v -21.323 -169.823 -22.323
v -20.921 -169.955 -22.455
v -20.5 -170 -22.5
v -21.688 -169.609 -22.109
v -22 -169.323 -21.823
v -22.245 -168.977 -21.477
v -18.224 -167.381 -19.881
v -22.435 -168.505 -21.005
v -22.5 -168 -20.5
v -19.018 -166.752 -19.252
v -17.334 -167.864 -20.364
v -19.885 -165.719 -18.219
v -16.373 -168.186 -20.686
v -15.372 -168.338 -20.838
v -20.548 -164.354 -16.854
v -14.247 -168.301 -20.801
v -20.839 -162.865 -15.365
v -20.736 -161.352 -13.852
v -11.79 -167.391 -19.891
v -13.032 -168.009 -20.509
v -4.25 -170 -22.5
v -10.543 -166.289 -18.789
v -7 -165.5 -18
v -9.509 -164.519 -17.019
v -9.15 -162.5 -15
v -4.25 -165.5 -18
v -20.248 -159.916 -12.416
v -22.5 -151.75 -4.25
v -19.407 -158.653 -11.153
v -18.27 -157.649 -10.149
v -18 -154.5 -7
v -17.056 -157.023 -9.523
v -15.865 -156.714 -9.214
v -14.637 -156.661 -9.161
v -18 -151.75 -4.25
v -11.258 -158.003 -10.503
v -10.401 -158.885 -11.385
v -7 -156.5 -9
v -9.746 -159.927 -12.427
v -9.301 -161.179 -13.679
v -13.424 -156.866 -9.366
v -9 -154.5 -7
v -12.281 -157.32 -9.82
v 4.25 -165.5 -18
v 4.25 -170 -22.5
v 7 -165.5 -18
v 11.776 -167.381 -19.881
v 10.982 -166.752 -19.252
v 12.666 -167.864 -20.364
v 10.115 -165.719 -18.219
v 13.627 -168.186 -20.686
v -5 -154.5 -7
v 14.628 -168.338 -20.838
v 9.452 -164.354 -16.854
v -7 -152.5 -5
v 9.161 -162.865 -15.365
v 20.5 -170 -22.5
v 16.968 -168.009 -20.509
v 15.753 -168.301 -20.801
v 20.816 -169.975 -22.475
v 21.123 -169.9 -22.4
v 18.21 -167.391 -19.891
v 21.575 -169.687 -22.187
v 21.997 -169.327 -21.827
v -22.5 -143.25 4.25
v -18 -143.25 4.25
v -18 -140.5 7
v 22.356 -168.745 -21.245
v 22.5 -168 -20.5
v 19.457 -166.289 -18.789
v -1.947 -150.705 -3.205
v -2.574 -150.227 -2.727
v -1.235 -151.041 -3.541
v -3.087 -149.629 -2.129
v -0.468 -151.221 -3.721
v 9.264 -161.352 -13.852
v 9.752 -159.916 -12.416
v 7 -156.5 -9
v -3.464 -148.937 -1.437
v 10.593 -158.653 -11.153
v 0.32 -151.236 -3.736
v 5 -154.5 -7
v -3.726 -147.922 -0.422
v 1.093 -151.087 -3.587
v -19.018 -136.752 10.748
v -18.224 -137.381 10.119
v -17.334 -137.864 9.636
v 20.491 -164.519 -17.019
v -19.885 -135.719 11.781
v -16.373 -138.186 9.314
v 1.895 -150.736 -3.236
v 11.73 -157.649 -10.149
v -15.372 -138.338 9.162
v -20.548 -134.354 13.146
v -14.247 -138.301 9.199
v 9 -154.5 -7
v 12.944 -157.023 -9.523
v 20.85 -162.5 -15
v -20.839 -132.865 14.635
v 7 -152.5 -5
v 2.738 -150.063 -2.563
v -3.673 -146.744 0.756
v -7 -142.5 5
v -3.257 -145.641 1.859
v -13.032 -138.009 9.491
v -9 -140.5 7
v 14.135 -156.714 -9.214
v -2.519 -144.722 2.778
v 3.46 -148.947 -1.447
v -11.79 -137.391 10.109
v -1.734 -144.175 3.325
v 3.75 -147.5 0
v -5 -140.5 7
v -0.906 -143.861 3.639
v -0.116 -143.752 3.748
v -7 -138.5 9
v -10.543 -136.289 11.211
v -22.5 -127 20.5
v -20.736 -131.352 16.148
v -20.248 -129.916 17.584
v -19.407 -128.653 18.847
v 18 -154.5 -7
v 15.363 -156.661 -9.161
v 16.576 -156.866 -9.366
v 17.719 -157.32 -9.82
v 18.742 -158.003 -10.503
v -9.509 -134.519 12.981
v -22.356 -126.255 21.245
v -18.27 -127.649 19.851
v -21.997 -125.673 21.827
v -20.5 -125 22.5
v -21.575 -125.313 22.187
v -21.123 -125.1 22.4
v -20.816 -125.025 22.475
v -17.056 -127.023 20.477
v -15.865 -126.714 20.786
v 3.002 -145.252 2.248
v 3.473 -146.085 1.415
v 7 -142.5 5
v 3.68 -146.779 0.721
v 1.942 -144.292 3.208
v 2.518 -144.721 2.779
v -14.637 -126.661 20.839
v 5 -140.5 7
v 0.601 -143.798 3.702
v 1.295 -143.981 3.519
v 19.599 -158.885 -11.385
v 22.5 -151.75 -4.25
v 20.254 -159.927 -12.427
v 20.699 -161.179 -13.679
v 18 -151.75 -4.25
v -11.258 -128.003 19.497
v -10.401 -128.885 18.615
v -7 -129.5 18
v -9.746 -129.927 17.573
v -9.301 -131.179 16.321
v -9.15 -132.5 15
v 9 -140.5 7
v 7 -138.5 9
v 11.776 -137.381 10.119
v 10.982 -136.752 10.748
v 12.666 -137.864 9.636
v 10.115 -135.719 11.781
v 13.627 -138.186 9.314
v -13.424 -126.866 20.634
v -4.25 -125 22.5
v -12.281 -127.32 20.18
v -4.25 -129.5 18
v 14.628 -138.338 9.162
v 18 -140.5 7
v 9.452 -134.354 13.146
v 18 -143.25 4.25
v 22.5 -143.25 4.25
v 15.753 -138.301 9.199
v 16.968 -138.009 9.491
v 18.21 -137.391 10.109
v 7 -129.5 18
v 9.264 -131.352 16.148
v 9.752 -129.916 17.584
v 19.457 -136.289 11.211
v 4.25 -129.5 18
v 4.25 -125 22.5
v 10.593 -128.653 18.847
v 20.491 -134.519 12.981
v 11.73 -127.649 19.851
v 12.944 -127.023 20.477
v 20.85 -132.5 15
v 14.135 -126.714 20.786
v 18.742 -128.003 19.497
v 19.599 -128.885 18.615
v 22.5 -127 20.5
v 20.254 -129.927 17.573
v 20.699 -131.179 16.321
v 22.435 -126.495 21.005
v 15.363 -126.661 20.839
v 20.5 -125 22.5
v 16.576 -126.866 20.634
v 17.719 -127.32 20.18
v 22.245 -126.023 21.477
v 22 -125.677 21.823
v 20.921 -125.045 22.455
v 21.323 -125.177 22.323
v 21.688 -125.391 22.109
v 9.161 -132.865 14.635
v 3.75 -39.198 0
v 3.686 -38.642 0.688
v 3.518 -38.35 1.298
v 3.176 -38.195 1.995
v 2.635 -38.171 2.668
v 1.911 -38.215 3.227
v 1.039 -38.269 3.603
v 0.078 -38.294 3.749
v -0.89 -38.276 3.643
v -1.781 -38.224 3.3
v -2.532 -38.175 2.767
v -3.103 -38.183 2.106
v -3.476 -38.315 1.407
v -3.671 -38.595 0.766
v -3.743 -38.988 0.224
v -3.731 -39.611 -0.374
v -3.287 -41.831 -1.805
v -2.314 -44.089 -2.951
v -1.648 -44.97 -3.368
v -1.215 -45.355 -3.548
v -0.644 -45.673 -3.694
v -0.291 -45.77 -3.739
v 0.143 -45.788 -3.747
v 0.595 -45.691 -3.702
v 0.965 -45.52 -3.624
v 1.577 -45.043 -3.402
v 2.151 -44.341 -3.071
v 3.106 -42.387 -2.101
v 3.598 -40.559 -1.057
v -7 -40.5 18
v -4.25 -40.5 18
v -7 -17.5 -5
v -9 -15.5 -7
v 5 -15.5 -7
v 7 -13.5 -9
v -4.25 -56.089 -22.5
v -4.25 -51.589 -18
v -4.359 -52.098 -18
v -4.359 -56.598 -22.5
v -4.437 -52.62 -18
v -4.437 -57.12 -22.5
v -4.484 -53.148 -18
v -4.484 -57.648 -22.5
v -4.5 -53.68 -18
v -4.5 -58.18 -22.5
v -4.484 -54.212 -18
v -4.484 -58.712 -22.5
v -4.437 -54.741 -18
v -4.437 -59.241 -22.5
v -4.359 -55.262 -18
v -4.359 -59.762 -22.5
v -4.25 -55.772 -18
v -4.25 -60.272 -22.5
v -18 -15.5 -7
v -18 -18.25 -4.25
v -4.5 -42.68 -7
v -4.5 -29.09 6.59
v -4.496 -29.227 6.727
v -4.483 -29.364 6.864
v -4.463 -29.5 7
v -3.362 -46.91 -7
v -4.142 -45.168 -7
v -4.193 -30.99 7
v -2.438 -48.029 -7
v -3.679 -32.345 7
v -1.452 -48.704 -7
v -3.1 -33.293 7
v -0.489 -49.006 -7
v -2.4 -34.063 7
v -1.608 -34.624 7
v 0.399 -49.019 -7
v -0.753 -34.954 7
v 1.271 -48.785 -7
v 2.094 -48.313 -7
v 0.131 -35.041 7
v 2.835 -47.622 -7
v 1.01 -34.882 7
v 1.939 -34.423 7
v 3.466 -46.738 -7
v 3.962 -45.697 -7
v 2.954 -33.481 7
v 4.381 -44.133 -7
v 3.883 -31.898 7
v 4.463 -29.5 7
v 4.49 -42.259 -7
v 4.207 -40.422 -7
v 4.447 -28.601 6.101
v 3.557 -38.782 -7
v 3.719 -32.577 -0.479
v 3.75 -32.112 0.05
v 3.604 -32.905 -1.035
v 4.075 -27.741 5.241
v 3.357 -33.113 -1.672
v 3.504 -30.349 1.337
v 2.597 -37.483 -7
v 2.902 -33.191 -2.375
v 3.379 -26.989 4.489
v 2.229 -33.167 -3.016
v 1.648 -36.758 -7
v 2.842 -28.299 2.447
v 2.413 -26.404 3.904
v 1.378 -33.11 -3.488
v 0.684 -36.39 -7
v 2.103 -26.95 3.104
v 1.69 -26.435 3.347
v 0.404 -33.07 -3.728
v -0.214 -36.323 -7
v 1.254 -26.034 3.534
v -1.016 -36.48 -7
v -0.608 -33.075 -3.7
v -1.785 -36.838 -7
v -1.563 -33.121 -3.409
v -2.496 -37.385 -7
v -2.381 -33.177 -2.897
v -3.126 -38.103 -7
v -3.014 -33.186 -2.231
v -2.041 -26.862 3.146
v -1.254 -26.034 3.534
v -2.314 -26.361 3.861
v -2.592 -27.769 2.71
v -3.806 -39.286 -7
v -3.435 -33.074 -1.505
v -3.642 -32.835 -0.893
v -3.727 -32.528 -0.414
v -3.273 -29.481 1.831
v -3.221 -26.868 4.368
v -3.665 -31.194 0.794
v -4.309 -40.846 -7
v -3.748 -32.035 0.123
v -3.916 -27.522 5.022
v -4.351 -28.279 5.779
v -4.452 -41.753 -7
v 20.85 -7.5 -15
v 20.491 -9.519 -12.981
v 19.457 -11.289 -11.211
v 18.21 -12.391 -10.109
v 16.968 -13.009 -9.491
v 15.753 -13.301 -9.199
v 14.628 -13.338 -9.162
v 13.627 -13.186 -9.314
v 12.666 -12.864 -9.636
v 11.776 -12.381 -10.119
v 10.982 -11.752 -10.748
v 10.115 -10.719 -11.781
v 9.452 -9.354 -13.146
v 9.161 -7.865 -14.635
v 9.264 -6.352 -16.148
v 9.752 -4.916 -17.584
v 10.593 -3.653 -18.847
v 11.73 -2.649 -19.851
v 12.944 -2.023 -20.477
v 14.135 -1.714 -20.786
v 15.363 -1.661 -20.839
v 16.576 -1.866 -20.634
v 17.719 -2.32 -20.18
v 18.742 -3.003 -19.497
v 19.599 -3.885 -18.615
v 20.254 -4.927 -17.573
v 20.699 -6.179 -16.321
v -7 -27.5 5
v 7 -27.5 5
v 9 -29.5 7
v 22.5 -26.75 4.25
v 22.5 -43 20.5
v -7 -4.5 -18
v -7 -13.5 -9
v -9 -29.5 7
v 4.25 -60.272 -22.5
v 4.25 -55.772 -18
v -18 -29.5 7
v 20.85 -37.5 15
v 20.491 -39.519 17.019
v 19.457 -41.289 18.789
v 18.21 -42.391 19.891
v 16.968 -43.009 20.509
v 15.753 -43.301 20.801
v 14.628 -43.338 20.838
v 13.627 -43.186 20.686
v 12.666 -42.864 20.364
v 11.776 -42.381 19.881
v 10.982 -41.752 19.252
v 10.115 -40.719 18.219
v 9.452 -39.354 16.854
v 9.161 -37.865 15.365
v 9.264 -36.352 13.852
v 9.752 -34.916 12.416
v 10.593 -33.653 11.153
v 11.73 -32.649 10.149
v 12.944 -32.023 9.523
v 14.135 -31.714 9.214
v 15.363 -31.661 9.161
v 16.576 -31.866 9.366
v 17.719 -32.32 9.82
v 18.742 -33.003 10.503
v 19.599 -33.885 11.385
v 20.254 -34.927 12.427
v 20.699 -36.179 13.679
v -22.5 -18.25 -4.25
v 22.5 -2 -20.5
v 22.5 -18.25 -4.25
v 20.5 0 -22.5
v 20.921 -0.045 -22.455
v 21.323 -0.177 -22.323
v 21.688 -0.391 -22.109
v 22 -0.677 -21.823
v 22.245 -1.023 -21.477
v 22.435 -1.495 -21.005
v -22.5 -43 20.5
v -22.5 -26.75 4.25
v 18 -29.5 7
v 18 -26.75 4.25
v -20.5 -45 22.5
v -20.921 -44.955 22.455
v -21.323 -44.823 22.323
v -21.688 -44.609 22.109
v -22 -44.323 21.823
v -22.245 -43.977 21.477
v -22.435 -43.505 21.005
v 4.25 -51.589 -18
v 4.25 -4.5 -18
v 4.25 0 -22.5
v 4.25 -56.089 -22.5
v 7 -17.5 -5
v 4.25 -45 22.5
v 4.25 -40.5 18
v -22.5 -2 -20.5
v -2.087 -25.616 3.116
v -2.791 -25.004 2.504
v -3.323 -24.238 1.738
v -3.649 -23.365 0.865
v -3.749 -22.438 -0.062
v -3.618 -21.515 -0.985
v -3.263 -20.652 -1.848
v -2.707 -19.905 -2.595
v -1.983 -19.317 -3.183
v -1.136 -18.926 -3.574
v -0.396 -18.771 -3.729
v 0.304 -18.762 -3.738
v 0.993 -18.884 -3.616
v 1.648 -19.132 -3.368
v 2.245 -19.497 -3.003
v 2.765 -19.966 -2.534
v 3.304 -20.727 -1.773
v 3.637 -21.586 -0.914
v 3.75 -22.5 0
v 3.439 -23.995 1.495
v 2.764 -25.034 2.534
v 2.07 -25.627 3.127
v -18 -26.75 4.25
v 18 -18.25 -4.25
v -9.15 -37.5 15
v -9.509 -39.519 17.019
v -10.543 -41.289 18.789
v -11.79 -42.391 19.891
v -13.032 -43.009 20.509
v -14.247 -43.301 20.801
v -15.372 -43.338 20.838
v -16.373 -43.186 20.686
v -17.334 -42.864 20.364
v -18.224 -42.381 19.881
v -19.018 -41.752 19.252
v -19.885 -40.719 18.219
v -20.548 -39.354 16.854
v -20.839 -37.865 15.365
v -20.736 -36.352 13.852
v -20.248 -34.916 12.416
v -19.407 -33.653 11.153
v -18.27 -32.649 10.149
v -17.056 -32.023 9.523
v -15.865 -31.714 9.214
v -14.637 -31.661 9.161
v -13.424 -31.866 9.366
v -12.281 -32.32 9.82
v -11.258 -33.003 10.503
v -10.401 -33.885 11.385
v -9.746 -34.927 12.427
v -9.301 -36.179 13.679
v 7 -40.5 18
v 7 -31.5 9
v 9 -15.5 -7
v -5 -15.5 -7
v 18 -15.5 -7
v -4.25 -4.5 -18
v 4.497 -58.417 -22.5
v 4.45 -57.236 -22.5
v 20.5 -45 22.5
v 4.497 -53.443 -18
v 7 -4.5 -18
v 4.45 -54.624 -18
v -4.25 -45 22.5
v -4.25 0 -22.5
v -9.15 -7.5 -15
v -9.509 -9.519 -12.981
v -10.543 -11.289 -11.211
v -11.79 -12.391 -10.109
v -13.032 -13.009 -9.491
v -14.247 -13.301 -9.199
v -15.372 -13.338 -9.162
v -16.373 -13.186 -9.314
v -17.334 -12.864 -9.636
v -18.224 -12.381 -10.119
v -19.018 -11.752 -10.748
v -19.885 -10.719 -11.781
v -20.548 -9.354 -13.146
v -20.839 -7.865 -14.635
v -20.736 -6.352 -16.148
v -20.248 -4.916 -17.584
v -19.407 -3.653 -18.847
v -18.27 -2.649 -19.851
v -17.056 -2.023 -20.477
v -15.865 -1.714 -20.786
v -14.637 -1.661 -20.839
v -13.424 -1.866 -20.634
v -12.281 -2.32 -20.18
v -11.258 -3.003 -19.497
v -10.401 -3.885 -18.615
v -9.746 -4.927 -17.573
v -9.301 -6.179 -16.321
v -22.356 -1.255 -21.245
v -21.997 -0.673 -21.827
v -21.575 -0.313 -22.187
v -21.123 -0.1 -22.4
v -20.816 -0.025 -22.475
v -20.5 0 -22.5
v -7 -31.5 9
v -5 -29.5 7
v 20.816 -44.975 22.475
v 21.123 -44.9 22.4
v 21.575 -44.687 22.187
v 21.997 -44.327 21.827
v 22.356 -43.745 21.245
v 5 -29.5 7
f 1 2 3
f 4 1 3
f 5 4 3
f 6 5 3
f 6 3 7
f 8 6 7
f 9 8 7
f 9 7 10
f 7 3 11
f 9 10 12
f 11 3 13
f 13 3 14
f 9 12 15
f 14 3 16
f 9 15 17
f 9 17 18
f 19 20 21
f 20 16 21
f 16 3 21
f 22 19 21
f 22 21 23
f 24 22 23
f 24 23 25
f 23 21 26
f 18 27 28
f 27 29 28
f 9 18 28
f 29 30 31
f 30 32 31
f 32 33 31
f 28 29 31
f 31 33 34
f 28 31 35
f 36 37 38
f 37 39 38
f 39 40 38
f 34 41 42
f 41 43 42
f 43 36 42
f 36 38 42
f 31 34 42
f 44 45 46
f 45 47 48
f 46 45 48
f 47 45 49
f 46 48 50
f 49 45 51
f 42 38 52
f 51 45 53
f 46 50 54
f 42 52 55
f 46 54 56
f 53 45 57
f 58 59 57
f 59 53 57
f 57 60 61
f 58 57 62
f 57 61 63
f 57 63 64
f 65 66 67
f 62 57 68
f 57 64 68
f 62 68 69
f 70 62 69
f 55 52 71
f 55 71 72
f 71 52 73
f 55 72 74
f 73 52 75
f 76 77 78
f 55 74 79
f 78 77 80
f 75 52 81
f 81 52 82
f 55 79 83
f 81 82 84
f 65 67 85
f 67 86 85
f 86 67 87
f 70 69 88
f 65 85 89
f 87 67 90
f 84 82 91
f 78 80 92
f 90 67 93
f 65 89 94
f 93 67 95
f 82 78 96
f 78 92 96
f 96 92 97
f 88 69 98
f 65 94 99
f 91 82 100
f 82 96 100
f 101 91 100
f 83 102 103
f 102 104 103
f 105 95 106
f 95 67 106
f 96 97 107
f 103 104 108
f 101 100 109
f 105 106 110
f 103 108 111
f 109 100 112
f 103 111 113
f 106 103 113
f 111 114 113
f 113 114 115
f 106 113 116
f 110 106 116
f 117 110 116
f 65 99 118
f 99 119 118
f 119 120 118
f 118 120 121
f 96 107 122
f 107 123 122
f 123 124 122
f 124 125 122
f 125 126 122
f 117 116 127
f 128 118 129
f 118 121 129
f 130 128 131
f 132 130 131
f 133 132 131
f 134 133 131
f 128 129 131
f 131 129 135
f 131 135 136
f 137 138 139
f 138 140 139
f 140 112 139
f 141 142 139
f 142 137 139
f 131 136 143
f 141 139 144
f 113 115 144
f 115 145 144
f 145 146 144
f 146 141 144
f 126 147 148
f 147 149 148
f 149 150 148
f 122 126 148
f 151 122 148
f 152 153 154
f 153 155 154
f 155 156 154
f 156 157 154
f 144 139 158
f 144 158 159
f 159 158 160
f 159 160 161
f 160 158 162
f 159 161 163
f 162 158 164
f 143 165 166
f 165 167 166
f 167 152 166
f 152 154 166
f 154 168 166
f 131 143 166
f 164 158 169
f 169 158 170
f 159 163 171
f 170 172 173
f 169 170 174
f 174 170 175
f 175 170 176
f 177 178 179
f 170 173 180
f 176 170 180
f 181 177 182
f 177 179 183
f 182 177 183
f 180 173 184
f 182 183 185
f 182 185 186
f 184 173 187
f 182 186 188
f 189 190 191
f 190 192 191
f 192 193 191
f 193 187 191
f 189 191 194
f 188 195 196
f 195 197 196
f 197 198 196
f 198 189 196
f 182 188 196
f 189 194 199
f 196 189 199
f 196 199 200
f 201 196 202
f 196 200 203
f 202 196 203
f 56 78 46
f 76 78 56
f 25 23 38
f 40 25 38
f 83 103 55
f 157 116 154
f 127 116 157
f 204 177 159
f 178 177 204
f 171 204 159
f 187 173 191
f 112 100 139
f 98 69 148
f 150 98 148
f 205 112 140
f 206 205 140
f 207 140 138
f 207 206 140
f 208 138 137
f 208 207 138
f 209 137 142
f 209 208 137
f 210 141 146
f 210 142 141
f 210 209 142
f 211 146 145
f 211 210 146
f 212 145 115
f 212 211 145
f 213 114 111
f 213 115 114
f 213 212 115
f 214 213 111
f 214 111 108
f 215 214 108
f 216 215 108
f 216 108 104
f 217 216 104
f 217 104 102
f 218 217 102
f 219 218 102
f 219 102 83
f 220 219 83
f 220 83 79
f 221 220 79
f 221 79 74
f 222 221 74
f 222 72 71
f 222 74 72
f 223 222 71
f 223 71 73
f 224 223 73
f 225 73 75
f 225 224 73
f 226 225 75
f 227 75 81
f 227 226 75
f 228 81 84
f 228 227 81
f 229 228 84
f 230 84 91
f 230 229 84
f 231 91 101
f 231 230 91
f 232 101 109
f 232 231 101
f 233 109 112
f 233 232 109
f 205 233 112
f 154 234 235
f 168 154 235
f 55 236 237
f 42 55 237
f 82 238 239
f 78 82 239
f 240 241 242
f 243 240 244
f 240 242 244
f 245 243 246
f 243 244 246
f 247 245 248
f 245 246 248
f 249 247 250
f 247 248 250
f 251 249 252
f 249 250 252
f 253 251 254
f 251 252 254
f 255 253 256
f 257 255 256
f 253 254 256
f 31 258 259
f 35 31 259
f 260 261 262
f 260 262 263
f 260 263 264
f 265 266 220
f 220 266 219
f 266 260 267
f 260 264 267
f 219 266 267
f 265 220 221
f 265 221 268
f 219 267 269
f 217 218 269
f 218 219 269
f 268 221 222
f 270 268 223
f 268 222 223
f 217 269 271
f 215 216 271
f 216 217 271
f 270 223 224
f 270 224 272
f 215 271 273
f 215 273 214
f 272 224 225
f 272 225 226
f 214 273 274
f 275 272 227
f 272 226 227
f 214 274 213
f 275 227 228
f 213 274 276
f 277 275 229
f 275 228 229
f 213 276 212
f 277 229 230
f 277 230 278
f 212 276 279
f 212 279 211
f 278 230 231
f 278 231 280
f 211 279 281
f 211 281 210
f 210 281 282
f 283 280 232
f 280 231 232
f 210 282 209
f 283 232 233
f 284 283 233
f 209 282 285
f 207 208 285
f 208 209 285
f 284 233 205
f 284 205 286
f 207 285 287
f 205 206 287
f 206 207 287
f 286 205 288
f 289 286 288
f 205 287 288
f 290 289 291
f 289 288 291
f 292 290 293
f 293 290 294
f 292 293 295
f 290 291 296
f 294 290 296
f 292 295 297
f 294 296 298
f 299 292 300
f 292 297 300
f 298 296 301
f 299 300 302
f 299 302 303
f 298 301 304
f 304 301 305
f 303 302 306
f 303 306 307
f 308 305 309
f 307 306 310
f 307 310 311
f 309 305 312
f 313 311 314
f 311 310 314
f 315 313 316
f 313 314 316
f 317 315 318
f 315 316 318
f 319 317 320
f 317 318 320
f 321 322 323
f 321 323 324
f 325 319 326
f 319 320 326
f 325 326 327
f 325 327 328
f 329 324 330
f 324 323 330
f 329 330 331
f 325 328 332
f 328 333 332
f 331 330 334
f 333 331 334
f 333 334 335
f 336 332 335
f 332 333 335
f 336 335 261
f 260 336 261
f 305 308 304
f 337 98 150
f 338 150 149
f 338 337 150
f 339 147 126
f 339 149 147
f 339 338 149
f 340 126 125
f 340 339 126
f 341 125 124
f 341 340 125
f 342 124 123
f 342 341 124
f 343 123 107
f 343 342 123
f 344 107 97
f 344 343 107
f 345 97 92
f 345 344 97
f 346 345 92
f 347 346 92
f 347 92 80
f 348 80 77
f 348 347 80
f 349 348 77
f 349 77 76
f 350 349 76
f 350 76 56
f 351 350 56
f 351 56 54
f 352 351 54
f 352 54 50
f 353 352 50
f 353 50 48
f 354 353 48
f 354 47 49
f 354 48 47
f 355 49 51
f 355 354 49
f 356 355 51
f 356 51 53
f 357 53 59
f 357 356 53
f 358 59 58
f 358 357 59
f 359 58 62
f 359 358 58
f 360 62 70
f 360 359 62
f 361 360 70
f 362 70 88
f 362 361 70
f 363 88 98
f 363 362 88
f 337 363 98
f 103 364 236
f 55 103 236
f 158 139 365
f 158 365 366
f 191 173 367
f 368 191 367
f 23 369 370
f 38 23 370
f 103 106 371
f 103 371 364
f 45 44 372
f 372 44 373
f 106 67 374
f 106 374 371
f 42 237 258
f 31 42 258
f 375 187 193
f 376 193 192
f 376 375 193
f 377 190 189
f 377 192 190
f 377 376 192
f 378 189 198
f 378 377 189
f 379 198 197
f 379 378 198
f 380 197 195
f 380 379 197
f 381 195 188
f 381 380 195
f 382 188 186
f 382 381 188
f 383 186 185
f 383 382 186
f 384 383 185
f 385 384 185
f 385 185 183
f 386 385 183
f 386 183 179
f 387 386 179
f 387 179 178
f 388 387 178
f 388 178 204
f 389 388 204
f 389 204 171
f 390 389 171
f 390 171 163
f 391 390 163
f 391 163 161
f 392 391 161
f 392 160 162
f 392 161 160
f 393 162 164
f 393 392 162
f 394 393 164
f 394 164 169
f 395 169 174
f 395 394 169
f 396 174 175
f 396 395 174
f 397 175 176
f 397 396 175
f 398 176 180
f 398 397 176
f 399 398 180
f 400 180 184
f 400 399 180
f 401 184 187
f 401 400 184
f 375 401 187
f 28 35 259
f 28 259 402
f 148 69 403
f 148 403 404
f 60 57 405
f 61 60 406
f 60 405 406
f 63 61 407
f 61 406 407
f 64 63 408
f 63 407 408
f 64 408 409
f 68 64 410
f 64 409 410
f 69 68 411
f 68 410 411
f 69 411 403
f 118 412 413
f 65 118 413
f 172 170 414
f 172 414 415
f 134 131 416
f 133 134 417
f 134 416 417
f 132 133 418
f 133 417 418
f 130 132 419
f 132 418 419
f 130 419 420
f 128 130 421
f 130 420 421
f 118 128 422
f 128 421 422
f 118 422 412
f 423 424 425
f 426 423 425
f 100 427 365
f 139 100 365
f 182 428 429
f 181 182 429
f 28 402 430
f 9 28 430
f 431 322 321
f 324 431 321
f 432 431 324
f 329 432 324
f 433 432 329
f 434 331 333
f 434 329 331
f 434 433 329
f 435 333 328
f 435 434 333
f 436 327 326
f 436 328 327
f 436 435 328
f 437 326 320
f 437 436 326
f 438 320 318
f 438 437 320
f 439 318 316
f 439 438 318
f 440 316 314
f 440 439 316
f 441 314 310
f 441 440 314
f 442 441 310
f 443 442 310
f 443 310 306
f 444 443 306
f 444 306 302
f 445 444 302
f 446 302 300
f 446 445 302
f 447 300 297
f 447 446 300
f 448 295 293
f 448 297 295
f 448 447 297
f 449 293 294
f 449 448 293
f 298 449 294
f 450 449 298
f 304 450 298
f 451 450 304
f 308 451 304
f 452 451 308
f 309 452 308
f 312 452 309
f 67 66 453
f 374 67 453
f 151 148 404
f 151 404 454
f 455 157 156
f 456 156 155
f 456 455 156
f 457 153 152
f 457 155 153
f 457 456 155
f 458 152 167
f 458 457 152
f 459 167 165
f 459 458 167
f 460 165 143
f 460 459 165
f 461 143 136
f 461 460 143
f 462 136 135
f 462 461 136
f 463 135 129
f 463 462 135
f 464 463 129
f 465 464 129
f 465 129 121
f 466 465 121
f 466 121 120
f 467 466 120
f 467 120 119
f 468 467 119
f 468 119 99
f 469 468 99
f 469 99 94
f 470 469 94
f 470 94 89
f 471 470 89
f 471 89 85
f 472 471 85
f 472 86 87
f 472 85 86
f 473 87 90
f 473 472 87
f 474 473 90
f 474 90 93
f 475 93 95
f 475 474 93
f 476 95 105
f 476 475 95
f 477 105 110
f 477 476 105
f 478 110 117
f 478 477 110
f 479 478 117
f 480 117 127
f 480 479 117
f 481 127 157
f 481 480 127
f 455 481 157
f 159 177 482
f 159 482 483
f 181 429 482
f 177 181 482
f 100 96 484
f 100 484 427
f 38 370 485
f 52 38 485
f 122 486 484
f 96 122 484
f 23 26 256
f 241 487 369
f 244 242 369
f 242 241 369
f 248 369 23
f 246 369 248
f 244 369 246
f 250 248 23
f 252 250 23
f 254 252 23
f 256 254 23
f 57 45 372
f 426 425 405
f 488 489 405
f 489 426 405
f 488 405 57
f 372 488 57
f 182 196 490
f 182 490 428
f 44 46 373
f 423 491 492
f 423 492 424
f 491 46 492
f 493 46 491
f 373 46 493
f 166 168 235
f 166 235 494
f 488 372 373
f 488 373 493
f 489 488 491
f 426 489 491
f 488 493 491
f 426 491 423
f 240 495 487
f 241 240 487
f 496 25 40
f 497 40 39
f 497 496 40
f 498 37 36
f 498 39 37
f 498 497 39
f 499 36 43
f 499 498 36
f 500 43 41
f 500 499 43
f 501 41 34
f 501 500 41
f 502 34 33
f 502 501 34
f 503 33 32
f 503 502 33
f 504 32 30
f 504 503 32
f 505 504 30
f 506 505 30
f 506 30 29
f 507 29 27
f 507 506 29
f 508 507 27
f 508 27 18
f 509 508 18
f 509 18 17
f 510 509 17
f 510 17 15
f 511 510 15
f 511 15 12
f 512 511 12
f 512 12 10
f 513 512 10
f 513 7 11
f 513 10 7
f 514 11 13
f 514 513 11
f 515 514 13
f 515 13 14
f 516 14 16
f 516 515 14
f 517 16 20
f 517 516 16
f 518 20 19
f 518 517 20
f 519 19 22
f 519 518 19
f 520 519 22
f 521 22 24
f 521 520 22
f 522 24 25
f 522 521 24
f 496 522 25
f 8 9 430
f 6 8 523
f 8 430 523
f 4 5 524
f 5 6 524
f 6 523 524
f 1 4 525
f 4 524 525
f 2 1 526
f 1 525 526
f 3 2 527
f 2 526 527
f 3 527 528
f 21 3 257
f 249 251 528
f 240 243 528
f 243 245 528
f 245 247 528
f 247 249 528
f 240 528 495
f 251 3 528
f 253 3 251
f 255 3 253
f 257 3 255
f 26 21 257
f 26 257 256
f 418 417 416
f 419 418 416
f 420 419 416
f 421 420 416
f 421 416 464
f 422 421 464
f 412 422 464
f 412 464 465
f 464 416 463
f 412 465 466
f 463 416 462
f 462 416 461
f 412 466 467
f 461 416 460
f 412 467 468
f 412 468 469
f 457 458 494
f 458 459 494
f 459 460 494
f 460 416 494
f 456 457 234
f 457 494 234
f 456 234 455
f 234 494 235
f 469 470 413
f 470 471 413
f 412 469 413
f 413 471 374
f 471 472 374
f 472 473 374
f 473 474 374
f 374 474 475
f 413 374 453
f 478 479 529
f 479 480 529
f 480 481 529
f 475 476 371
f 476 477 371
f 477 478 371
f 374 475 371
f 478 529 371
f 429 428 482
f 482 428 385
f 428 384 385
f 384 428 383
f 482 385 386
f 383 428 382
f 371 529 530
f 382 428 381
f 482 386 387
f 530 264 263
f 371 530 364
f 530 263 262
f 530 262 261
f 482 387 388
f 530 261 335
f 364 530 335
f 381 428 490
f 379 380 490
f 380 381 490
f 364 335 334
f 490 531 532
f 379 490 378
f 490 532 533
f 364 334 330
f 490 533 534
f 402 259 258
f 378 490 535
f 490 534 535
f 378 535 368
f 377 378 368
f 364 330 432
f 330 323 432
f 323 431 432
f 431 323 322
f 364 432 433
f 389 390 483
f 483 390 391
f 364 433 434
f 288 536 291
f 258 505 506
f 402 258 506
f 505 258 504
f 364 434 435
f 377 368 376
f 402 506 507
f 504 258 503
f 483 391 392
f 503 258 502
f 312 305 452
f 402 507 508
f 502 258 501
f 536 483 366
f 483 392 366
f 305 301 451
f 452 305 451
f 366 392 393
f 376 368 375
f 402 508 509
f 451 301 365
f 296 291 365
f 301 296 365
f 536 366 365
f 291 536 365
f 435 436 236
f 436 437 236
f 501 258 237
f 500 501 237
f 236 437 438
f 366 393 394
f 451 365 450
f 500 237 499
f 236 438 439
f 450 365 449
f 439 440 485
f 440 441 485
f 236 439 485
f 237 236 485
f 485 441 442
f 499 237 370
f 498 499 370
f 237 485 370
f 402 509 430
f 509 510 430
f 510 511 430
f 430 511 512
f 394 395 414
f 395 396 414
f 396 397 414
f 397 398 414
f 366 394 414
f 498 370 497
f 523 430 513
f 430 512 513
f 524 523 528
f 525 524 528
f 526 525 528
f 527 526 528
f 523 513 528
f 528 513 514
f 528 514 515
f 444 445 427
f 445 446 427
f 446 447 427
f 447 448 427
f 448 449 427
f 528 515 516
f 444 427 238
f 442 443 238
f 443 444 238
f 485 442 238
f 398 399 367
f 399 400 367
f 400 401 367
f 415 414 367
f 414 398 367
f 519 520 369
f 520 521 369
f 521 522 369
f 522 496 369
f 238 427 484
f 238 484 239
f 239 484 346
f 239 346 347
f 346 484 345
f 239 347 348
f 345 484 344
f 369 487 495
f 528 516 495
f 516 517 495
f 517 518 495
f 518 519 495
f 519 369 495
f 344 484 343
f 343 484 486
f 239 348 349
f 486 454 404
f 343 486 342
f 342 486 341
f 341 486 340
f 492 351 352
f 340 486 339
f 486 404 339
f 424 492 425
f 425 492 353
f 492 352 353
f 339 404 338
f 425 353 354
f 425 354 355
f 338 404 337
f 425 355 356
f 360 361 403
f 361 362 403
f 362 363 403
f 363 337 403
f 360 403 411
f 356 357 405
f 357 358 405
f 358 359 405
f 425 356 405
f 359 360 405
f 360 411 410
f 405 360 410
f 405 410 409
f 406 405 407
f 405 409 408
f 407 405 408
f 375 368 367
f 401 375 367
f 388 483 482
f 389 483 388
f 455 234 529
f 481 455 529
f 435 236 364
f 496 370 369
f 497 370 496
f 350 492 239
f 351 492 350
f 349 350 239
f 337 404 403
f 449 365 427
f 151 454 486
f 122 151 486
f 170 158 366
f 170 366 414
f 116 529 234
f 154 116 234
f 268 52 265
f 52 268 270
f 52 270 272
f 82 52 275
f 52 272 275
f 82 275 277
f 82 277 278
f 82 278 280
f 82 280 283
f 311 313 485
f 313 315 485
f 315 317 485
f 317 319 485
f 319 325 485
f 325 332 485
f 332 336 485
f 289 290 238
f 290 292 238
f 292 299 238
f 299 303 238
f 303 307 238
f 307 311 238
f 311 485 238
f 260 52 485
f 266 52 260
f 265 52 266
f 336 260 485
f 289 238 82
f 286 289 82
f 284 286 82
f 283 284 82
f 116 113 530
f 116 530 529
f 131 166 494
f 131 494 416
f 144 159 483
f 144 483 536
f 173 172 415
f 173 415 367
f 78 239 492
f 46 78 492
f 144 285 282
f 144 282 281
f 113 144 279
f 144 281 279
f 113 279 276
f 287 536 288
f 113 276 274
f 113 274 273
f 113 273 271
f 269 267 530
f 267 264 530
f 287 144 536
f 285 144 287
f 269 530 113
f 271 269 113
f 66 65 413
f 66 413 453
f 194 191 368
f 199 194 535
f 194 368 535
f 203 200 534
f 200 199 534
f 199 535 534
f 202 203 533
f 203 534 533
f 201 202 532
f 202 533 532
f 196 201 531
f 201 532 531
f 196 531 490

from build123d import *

# Parameters (mm, degrees)
F0_R     = 5.85
F0_R_2   = 3.75
F1_DEPTH = 170
F3_DEPTH = 45.001
F4_R     = 4.5
F5_DEPTH = 120.209153


with BuildPart() as f1:
    # F0 (on Front) → F1 (new body)
    with BuildSketch(Plane.XZ):
        with BuildLine():
            ThreePointArc((22.5, 20.5), (21.914214, 21.914214), (20.5, 22.5))
            Line((20.5, 22.5), (4.25, 22.5))
            Line((4.25, 22.5), (4.25, 18))
            Line((4.25, 18), (7, 18))
            Line((7, 18), (7, 9))
            Line((7, 9), (5, 7))
            Line((5, 7), (-5, 7))
            Line((-5, 7), (-7, 9))
            Line((-7, 9), (-7, 18))
            Line((-7, 18), (-4.25, 18))
            Line((-4.25, 18), (-4.25, 22.5))
            Line((-4.25, 22.5), (-20.5, 22.5))
            ThreePointArc((-20.5, 22.5), (-21.914214, 21.914214), (-22.5, 20.5))
            Line((-22.5, 20.5), (-22.5, 4.25))
            Line((-22.5, 4.25), (-18, 4.25))
            Line((-18, 4.25), (-18, 7))
            Line((-18, 7), (-9, 7))
            Line((-9, 7), (-7, 5))
            Line((-7, 5), (-7, -5))
            Line((-7, -5), (-9, -7))
            Line((-9, -7), (-18, -7))
            Line((-18, -7), (-18, -4.25))
            Line((-18, -4.25), (-22.5, -4.25))
            Line((-22.5, -4.25), (-22.5, -20.5))
            ThreePointArc((-22.5, -20.5), (-21.914214, -21.914214), (-20.5, -22.5))
            Line((-20.5, -22.5), (-4.25, -22.5))
            Line((-4.25, -22.5), (-4.25, -18))
            Line((-4.25, -18), (-7, -18))
            Line((-7, -18), (-7, -9))
            Line((-7, -9), (-5, -7))
            Line((-5, -7), (5, -7))
            Line((5, -7), (7, -9))
            Line((7, -9), (7, -18))
            Line((7, -18), (4.25, -18))
            Line((4.25, -18), (4.25, -22.5))
            Line((4.25, -22.5), (20.5, -22.5))
            ThreePointArc((20.5, -22.5), (21.914214, -21.914214), (22.5, -20.5))
            Line((22.5, -20.5), (22.5, -4.25))
            Line((22.5, -4.25), (18, -4.25))
            Line((18, -4.25), (18, -7))
            Line((18, -7), (9, -7))
            Line((9, -7), (7, -5))
            Line((7, -5), (7, 5))
            Line((7, 5), (9, 7))
            Line((9, 7), (18, 7))
            Line((18, 7), (18, 4.25))
            Line((18, 4.25), (22.5, 4.25))
            Line((22.5, 4.25), (22.5, 20.5))
        make_face()
        with Locations((-15, -15)):
            Circle(F0_R, mode=Mode.SUBTRACT)
        with Locations((15, -15)):
            Circle(F0_R, mode=Mode.SUBTRACT)
        with Locations((-15, 15)):
            Circle(F0_R, mode=Mode.SUBTRACT)
        Circle(F0_R_2, mode=Mode.SUBTRACT)
        with Locations((15, 15)):
            Circle(F0_R, mode=Mode.SUBTRACT)
    extrude(amount=F1_DEPTH)

    # F2 (on face) → F3 (cut, through all)
    with BuildSketch(Plane.YZ.offset(22.5)):
        Polygon((-170, 22.5), (-170, -22.5), (-125, 22.5), align=None)
        Polygon((0, -22.5), (0, 22.5), (-45, 22.5), align=None)
    extrude(amount=-F3_DEPTH, mode=Mode.SUBTRACT)

    # F4 (on face) → F5 (cut, through all)
    with BuildSketch(Plane(origin=(0, -11.25, -11.25), x_dir=(-1, 0, 0), z_dir=(0, 0.707107, 0.707107))):
        with Locations((0, 25.229708)):
            Circle(F4_R)
    extrude(amount=-F5_DEPTH, mode=Mode.SUBTRACT)


solid = f1.part
